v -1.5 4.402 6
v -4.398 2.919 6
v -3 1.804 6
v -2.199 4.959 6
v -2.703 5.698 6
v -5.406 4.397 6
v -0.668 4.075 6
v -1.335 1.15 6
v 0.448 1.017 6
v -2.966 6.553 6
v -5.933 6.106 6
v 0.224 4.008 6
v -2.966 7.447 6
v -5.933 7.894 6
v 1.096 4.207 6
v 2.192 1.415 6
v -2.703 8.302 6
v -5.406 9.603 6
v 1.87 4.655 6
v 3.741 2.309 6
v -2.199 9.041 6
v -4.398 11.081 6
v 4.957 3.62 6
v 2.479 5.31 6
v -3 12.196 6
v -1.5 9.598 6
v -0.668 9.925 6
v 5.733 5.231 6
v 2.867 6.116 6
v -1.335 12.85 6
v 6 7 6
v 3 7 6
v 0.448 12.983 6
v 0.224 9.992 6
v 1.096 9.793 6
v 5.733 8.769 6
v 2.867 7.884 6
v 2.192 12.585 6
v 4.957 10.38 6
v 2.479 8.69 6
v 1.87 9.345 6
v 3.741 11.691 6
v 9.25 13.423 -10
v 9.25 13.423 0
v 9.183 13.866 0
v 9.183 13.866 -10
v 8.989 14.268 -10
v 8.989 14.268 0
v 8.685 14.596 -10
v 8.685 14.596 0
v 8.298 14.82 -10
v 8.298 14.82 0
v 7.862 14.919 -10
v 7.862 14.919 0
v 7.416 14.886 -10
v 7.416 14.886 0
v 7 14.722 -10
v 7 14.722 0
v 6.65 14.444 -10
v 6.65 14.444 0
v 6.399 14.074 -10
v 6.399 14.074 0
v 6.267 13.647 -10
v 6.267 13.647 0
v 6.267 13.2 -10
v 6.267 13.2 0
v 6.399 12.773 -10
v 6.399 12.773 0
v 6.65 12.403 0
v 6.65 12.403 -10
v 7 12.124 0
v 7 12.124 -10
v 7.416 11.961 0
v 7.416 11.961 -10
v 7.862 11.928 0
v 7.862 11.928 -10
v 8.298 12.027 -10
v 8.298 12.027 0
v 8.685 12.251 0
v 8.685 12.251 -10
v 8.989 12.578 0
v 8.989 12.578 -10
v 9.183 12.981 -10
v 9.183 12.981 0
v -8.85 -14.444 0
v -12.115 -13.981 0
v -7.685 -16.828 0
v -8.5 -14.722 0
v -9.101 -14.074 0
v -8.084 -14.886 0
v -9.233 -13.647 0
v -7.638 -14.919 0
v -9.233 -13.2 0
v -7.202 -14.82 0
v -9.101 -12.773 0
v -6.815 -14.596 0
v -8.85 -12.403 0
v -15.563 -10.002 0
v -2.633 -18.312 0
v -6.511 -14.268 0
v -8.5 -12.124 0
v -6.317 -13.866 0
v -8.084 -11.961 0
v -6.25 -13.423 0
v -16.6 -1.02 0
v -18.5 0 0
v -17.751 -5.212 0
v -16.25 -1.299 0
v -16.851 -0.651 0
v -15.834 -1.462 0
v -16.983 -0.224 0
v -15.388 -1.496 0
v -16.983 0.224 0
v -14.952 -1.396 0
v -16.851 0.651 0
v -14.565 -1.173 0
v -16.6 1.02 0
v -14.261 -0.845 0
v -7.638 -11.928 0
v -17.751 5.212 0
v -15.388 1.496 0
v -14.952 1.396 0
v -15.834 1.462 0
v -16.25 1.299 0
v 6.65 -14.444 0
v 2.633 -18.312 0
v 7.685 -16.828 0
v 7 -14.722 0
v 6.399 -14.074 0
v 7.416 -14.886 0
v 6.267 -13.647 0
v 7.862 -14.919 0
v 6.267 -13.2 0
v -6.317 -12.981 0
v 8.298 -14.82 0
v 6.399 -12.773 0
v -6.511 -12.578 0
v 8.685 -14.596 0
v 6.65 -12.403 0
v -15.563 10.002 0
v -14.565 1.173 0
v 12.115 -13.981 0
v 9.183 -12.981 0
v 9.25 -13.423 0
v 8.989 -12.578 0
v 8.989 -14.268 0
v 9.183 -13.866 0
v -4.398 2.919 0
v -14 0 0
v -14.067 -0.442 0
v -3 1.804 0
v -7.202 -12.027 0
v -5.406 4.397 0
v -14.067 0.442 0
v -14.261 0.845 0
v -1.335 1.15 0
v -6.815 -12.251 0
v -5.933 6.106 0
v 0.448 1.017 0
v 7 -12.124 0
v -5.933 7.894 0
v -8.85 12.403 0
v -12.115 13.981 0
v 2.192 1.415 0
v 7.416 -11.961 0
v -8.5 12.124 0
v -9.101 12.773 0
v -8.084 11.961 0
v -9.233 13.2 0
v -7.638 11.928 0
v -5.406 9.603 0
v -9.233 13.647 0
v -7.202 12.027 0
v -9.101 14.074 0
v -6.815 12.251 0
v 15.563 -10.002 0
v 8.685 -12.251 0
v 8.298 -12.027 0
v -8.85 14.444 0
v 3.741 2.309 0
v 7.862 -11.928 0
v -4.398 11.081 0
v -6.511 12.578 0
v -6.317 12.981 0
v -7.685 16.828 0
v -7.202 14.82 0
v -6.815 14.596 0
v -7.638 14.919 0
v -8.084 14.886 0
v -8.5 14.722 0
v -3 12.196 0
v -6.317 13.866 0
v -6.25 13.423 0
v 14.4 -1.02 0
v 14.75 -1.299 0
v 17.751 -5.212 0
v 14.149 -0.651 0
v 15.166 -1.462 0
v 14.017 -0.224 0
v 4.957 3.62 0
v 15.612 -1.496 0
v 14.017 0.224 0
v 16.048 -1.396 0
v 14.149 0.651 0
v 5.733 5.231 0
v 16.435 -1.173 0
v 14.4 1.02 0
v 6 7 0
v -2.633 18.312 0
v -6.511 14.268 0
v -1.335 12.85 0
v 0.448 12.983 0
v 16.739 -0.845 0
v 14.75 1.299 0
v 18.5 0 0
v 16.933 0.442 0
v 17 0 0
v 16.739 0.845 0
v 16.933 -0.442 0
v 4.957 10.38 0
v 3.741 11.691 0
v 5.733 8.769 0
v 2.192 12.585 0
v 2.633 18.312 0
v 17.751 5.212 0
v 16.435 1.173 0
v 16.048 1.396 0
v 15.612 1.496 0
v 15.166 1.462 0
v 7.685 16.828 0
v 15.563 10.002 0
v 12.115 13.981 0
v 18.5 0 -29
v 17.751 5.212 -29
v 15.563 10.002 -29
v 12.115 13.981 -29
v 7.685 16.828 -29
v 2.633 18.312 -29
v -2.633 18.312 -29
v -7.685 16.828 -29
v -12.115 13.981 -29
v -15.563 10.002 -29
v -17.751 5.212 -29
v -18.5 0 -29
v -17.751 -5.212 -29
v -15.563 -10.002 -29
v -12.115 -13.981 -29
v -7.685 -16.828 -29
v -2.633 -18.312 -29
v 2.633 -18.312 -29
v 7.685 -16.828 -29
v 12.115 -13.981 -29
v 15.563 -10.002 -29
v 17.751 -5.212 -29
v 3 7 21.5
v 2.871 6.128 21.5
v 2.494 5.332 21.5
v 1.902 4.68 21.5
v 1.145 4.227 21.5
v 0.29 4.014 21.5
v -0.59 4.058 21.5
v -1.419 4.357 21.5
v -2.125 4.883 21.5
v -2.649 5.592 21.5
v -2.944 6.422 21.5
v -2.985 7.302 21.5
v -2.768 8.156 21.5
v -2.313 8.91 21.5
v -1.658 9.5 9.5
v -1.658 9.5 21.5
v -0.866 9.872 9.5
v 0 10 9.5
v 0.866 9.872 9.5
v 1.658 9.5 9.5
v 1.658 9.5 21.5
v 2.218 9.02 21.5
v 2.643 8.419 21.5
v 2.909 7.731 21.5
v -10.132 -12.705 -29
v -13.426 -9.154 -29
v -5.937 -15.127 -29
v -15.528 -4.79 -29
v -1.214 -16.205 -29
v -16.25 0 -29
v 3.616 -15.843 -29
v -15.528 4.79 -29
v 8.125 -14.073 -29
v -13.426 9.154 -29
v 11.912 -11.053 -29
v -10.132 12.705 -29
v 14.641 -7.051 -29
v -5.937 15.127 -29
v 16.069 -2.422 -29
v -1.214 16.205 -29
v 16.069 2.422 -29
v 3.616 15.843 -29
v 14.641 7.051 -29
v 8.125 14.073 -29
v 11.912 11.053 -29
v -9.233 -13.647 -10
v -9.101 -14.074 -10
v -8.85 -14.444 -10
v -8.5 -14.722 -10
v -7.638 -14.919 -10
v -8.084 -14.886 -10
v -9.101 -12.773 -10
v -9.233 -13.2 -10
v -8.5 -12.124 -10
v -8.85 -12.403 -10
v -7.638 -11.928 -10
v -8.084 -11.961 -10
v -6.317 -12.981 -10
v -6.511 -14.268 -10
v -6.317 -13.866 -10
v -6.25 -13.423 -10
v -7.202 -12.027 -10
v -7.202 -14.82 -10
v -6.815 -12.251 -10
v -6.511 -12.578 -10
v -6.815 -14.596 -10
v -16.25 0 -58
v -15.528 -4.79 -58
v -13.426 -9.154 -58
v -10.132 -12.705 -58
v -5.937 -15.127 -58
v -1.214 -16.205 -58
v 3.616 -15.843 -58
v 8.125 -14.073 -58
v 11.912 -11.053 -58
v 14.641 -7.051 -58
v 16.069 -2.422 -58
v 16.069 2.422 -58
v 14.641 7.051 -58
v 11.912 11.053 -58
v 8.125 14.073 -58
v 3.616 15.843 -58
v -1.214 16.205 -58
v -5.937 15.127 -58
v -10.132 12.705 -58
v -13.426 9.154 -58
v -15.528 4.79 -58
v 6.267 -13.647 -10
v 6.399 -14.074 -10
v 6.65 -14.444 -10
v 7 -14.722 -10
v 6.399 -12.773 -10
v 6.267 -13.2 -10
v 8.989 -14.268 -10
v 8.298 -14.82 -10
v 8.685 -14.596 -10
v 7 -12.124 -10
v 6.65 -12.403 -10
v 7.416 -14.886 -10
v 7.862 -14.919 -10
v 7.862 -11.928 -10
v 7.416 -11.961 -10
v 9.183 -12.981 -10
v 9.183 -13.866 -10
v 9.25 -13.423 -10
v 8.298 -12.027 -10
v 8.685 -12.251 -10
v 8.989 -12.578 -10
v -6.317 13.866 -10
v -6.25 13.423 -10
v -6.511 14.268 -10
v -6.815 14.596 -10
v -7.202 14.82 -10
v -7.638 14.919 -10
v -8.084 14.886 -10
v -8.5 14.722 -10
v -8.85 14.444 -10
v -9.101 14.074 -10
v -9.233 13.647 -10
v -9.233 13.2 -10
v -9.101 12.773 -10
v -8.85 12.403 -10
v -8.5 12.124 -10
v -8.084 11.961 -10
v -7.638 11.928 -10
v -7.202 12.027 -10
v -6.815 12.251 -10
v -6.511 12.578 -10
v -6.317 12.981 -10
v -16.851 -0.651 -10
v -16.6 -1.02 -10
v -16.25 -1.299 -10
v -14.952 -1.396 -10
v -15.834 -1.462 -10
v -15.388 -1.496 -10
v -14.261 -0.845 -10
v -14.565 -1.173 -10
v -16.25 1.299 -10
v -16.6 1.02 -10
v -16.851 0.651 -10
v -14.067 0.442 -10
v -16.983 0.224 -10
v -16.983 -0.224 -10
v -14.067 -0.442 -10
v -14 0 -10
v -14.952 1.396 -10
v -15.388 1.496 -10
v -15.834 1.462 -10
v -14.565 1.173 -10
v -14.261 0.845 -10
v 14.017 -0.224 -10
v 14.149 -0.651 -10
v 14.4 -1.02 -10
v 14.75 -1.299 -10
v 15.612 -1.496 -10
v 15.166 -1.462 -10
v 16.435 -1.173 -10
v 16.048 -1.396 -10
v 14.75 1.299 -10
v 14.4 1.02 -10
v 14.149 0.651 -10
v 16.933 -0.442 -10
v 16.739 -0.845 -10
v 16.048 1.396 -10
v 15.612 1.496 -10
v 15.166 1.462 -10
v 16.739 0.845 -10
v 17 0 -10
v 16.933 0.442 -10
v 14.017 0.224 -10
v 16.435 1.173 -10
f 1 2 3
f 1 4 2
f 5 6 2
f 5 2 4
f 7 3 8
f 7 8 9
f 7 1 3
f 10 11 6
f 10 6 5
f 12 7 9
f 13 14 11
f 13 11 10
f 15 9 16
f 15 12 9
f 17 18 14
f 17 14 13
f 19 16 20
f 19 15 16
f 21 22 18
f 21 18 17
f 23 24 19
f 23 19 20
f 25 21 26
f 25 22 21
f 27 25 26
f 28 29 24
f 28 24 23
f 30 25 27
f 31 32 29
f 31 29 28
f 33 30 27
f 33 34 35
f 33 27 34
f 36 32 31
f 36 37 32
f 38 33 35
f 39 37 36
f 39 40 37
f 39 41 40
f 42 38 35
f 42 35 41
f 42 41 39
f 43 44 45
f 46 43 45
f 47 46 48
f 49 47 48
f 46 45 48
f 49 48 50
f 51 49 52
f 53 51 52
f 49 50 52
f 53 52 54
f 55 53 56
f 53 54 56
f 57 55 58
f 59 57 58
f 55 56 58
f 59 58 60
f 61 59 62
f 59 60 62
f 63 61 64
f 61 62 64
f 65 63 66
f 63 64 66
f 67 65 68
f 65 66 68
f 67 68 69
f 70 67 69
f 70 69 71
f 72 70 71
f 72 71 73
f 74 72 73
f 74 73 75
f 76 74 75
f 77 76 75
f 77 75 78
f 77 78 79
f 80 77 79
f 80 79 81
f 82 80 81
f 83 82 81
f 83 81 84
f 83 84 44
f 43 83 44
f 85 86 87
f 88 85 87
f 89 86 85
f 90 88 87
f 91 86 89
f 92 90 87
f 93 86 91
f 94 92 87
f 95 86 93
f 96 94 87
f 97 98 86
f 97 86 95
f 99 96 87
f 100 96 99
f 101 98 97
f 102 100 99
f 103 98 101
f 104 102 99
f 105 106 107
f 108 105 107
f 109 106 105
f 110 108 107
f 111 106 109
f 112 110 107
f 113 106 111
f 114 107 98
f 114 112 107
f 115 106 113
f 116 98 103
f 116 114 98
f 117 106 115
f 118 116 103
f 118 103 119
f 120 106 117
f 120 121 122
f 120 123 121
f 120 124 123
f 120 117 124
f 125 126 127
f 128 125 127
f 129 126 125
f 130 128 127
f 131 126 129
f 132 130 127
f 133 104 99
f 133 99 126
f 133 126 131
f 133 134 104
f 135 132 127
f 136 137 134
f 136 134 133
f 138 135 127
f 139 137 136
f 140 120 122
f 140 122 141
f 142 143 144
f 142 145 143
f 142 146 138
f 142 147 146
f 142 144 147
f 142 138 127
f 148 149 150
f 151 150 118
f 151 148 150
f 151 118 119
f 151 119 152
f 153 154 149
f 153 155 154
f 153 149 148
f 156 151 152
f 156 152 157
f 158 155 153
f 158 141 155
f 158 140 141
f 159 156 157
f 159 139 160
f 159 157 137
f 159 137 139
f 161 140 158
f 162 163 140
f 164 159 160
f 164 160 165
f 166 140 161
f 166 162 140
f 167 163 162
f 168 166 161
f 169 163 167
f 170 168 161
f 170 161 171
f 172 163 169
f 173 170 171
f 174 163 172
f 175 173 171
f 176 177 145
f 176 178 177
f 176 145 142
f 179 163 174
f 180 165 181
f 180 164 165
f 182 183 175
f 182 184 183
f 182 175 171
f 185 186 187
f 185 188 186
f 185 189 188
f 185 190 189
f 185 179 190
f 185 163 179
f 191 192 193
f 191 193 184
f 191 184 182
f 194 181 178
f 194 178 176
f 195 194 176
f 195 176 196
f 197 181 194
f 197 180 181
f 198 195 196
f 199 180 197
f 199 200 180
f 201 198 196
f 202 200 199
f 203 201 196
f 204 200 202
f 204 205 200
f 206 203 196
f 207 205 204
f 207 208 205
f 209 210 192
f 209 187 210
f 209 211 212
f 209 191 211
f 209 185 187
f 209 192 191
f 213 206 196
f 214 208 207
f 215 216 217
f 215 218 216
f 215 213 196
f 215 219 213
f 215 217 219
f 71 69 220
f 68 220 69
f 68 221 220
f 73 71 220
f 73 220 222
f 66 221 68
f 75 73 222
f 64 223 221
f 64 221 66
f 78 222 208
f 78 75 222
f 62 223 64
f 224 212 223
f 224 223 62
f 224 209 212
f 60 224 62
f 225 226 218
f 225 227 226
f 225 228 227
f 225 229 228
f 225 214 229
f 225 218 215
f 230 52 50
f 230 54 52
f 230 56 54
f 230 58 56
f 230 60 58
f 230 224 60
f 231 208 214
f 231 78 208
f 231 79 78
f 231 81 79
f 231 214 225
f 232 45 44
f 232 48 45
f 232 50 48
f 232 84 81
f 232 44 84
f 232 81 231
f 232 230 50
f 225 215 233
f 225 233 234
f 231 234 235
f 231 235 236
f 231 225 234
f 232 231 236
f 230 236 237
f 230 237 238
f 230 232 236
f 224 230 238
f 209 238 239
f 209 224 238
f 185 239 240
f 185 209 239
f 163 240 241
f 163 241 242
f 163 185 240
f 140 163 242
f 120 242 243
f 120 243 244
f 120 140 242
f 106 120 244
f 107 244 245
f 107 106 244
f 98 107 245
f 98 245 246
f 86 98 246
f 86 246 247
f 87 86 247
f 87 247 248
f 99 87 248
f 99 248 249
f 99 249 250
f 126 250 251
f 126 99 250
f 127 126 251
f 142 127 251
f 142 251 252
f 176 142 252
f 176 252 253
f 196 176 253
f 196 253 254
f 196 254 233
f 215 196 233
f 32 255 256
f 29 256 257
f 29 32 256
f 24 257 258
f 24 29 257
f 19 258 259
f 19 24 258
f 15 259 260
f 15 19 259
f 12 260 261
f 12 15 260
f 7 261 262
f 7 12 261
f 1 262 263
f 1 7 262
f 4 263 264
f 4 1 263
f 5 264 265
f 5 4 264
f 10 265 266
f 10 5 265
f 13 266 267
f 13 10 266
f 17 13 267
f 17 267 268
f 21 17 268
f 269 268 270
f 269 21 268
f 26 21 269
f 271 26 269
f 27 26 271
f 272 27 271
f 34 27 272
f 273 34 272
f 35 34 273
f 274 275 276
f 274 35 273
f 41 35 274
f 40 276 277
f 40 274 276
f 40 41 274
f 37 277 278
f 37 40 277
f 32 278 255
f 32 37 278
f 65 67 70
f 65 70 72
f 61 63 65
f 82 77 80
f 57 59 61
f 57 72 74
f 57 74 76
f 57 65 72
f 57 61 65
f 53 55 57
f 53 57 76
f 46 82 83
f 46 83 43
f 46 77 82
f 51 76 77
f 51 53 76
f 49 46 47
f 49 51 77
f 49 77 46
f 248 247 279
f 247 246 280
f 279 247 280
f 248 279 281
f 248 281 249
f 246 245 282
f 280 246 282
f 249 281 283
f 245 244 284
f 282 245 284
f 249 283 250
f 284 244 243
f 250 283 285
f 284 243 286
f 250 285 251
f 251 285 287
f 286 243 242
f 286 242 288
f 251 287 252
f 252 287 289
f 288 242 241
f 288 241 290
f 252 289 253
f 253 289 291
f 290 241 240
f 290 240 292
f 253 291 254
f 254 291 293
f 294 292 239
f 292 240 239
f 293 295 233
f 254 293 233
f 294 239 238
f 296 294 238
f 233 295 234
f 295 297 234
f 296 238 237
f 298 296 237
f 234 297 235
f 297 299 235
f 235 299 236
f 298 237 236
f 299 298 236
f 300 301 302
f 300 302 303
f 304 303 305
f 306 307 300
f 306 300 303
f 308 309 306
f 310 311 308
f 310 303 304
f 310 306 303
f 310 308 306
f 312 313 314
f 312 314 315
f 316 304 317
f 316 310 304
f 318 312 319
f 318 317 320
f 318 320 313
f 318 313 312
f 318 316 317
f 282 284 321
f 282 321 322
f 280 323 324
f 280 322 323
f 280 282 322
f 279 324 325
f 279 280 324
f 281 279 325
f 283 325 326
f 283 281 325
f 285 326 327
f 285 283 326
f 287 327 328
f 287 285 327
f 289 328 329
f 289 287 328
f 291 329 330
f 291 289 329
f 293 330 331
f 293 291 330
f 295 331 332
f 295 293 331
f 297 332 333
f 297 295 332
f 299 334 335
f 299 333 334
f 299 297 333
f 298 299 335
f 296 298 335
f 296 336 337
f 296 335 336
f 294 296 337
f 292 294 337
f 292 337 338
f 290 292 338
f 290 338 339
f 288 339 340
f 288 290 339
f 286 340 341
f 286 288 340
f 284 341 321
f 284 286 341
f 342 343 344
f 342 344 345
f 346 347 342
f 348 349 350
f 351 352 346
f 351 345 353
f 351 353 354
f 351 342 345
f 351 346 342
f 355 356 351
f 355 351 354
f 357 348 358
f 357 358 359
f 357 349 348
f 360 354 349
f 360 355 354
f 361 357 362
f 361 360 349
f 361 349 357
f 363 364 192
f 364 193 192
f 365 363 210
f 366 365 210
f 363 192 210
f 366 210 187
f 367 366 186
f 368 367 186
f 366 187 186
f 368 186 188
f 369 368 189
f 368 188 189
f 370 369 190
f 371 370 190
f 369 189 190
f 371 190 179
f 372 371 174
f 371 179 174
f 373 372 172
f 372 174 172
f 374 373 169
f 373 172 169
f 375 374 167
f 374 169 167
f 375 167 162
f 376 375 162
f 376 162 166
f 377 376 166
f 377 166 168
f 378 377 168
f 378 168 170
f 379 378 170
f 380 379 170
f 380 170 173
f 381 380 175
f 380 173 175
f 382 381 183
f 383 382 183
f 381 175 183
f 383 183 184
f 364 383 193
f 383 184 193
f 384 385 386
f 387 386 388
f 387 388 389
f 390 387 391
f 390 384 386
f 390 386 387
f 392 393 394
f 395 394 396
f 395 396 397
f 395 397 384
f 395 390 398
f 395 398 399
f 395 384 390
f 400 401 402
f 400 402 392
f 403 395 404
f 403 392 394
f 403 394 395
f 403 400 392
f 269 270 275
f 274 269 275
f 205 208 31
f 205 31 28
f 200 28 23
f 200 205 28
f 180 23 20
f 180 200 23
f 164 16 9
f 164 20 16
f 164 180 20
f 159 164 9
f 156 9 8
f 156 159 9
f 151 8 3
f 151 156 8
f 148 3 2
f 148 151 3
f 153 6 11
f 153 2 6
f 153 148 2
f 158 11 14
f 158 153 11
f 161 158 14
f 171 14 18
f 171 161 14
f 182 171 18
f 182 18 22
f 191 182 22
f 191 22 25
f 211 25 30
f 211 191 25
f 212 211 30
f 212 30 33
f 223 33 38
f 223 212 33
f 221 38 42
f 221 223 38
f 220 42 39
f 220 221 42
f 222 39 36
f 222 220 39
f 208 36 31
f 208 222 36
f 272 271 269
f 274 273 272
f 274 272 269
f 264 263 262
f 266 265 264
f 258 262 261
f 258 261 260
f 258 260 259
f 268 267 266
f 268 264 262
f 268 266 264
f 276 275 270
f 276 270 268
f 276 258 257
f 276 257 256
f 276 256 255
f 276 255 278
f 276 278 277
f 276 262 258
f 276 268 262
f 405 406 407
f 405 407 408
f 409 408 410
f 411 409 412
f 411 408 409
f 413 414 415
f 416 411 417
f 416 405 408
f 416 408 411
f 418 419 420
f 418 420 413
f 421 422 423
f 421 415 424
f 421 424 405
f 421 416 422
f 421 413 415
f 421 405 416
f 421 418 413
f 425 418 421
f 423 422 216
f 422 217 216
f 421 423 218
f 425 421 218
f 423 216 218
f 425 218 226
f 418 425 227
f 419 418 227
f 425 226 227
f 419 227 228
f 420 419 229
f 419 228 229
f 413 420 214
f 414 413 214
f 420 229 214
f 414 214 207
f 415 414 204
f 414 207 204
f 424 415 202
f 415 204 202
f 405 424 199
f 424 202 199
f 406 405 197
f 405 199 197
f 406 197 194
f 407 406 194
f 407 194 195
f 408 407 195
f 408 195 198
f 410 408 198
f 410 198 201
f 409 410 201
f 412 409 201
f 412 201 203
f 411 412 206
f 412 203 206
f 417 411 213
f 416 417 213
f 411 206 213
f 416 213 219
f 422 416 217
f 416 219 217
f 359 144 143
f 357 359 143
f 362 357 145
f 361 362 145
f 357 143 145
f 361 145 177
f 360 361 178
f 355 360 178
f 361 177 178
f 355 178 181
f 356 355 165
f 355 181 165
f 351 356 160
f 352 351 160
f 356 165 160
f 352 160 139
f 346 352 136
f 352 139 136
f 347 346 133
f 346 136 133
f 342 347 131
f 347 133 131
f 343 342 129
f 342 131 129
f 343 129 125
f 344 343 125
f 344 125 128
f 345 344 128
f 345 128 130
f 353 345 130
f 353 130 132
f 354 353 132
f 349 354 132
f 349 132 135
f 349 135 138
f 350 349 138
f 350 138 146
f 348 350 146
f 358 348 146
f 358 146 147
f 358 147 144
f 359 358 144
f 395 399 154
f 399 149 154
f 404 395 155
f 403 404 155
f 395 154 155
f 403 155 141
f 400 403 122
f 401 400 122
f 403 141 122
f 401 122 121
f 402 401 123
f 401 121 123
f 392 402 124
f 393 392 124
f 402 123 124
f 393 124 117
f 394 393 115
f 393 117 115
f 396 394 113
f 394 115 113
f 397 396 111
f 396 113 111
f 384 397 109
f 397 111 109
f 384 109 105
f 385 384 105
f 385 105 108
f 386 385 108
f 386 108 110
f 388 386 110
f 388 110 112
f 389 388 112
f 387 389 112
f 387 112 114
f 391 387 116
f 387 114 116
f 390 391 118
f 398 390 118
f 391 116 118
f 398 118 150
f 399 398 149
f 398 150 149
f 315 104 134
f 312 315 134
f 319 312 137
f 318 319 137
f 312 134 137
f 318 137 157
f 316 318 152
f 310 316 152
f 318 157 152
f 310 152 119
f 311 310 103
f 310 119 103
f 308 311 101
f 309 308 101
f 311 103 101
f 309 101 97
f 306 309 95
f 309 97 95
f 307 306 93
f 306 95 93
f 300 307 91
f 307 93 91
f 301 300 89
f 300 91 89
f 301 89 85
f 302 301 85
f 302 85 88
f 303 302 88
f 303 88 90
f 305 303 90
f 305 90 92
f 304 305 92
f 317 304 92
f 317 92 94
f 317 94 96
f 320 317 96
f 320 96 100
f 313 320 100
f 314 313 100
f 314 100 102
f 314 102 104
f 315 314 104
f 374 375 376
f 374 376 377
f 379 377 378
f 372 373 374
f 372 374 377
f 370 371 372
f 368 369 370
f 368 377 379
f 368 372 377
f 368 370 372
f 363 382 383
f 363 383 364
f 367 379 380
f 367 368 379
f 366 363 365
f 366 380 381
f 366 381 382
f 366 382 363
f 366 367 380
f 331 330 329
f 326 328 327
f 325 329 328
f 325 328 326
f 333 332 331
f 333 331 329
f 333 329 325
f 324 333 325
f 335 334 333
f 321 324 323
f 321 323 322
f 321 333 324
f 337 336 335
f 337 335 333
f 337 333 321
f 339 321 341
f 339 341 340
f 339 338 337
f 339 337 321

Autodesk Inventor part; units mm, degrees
ref_plane "YZ Plane" through (0, 0, 0) normal (1, 0, 0) x (0, 1, 0)
ref_plane "XZ Plane" through (0, 0, 0) normal (0, 1, 0) x (-1, 0, 0)
ref_plane "XY Plane" through (0, 0, 0) normal (0, 0, 1) x (1, 0, 0)
sketch "Sketch1" plane through (0, 0, 0) normal (0, 0, 1) x (1, 0, 0)
  circle A0 centre (0, 0) radius 18.5
  line L0 (0, 0) -> (0, 7) construction
  circle A1 centre (0, 7) radius 6
  dimension "d0" = 37
  dimension "d1" = 7
  dimension "d2" = 12
extrude "Extrusion1" add sketch "Sketch1" against normal blind 29 contours A0 | A1
extrude "Extrusion2" add sketch "Sketch1" along normal blind 6 contours A1
sketch "Sketch2" plane through (0, 7, 6) normal (0, 0, 1) x (1, 0, 0)
  circle A0 centre (0, 0) radius 3
  point P0 (0, -7)
  dimension "d7" = 6
extrude "Extrusion3" add sketch "Sketch2" along normal blind 15.5
sketch "Sketch3" plane through (0, 0, -29) normal (0, 0, -1) x (-1, 0, 0)
  circle A0 centre (0, 0) radius 16.25
  dimension "d10" = 32.5
extrude "Extrusion4" add sketch "Sketch3" along normal blind 29
sketch "Sketch4" plane through (0, 7, 21.5) normal (0, 0, 1) x (1, 0, 0)
  circle A0 centre (0, 0) radius 3 projected
  arc A1 (-1.6583, 2.5) -> (1.6583, 2.5) centre (0, 0) ccw
  line L0 (-4.0487, 2.5) -> (4.6782, 2.5)
  arc A2 (1.6583, 2.5) -> (-1.6583, 2.5) centre (0, 0) ccw
  point P0 (0, -7)
  point P1 (0, -3)
  point P2 (-1.6583, 2.5)
  point P3 (1.6583, 2.5)
  dimension "d13" = 6
  dimension "d14" = 5.5
extrude "Extrusion5" cut sketch "Sketch4" against normal blind 12 contours L0 A0 picked at (-0.1169, 2.6598)
sketch "Sketch5" plane through (0, 0, 0) normal (0, 0, 1) x (1, 0, 0)
  circle A0 centre (0, 0) radius 15.5 construction
  line L0 (-7.75, -13.4234) -> (12.777, 22.1304) construction
  line L1 (0, 0) -> (25.5539, 0) construction
  line L2 (7.75, -13.4234) -> (-11.3824, 19.7148) construction
  line L3 (0, 0) -> (22.7647, 0) construction
  circle A1 centre (-15.5, 0) radius 1.5
  circle A2 centre (-7.75, 13.4234) radius 1.5
  circle A3 centre (7.75, 13.4234) radius 1.5
  circle A4 centre (15.5, 0) radius 1.5
  circle A5 centre (7.75, -13.4234) radius 1.5
  circle A6 centre (-7.75, -13.4234) radius 1.5
  dimension "d17" = 31
  dimension "d18" = 60
  dimension "d19" = 120
  dimension "d20" = 3
  dimension "d21" = 3
  dimension "d22" = 3
  dimension "d23" = 3
  dimension "d24" = 3
  dimension "d25" = 3
extrude "Extrusion6" cut sketch "Sketch5" against normal blind 10
properties part number "motor12kg"
